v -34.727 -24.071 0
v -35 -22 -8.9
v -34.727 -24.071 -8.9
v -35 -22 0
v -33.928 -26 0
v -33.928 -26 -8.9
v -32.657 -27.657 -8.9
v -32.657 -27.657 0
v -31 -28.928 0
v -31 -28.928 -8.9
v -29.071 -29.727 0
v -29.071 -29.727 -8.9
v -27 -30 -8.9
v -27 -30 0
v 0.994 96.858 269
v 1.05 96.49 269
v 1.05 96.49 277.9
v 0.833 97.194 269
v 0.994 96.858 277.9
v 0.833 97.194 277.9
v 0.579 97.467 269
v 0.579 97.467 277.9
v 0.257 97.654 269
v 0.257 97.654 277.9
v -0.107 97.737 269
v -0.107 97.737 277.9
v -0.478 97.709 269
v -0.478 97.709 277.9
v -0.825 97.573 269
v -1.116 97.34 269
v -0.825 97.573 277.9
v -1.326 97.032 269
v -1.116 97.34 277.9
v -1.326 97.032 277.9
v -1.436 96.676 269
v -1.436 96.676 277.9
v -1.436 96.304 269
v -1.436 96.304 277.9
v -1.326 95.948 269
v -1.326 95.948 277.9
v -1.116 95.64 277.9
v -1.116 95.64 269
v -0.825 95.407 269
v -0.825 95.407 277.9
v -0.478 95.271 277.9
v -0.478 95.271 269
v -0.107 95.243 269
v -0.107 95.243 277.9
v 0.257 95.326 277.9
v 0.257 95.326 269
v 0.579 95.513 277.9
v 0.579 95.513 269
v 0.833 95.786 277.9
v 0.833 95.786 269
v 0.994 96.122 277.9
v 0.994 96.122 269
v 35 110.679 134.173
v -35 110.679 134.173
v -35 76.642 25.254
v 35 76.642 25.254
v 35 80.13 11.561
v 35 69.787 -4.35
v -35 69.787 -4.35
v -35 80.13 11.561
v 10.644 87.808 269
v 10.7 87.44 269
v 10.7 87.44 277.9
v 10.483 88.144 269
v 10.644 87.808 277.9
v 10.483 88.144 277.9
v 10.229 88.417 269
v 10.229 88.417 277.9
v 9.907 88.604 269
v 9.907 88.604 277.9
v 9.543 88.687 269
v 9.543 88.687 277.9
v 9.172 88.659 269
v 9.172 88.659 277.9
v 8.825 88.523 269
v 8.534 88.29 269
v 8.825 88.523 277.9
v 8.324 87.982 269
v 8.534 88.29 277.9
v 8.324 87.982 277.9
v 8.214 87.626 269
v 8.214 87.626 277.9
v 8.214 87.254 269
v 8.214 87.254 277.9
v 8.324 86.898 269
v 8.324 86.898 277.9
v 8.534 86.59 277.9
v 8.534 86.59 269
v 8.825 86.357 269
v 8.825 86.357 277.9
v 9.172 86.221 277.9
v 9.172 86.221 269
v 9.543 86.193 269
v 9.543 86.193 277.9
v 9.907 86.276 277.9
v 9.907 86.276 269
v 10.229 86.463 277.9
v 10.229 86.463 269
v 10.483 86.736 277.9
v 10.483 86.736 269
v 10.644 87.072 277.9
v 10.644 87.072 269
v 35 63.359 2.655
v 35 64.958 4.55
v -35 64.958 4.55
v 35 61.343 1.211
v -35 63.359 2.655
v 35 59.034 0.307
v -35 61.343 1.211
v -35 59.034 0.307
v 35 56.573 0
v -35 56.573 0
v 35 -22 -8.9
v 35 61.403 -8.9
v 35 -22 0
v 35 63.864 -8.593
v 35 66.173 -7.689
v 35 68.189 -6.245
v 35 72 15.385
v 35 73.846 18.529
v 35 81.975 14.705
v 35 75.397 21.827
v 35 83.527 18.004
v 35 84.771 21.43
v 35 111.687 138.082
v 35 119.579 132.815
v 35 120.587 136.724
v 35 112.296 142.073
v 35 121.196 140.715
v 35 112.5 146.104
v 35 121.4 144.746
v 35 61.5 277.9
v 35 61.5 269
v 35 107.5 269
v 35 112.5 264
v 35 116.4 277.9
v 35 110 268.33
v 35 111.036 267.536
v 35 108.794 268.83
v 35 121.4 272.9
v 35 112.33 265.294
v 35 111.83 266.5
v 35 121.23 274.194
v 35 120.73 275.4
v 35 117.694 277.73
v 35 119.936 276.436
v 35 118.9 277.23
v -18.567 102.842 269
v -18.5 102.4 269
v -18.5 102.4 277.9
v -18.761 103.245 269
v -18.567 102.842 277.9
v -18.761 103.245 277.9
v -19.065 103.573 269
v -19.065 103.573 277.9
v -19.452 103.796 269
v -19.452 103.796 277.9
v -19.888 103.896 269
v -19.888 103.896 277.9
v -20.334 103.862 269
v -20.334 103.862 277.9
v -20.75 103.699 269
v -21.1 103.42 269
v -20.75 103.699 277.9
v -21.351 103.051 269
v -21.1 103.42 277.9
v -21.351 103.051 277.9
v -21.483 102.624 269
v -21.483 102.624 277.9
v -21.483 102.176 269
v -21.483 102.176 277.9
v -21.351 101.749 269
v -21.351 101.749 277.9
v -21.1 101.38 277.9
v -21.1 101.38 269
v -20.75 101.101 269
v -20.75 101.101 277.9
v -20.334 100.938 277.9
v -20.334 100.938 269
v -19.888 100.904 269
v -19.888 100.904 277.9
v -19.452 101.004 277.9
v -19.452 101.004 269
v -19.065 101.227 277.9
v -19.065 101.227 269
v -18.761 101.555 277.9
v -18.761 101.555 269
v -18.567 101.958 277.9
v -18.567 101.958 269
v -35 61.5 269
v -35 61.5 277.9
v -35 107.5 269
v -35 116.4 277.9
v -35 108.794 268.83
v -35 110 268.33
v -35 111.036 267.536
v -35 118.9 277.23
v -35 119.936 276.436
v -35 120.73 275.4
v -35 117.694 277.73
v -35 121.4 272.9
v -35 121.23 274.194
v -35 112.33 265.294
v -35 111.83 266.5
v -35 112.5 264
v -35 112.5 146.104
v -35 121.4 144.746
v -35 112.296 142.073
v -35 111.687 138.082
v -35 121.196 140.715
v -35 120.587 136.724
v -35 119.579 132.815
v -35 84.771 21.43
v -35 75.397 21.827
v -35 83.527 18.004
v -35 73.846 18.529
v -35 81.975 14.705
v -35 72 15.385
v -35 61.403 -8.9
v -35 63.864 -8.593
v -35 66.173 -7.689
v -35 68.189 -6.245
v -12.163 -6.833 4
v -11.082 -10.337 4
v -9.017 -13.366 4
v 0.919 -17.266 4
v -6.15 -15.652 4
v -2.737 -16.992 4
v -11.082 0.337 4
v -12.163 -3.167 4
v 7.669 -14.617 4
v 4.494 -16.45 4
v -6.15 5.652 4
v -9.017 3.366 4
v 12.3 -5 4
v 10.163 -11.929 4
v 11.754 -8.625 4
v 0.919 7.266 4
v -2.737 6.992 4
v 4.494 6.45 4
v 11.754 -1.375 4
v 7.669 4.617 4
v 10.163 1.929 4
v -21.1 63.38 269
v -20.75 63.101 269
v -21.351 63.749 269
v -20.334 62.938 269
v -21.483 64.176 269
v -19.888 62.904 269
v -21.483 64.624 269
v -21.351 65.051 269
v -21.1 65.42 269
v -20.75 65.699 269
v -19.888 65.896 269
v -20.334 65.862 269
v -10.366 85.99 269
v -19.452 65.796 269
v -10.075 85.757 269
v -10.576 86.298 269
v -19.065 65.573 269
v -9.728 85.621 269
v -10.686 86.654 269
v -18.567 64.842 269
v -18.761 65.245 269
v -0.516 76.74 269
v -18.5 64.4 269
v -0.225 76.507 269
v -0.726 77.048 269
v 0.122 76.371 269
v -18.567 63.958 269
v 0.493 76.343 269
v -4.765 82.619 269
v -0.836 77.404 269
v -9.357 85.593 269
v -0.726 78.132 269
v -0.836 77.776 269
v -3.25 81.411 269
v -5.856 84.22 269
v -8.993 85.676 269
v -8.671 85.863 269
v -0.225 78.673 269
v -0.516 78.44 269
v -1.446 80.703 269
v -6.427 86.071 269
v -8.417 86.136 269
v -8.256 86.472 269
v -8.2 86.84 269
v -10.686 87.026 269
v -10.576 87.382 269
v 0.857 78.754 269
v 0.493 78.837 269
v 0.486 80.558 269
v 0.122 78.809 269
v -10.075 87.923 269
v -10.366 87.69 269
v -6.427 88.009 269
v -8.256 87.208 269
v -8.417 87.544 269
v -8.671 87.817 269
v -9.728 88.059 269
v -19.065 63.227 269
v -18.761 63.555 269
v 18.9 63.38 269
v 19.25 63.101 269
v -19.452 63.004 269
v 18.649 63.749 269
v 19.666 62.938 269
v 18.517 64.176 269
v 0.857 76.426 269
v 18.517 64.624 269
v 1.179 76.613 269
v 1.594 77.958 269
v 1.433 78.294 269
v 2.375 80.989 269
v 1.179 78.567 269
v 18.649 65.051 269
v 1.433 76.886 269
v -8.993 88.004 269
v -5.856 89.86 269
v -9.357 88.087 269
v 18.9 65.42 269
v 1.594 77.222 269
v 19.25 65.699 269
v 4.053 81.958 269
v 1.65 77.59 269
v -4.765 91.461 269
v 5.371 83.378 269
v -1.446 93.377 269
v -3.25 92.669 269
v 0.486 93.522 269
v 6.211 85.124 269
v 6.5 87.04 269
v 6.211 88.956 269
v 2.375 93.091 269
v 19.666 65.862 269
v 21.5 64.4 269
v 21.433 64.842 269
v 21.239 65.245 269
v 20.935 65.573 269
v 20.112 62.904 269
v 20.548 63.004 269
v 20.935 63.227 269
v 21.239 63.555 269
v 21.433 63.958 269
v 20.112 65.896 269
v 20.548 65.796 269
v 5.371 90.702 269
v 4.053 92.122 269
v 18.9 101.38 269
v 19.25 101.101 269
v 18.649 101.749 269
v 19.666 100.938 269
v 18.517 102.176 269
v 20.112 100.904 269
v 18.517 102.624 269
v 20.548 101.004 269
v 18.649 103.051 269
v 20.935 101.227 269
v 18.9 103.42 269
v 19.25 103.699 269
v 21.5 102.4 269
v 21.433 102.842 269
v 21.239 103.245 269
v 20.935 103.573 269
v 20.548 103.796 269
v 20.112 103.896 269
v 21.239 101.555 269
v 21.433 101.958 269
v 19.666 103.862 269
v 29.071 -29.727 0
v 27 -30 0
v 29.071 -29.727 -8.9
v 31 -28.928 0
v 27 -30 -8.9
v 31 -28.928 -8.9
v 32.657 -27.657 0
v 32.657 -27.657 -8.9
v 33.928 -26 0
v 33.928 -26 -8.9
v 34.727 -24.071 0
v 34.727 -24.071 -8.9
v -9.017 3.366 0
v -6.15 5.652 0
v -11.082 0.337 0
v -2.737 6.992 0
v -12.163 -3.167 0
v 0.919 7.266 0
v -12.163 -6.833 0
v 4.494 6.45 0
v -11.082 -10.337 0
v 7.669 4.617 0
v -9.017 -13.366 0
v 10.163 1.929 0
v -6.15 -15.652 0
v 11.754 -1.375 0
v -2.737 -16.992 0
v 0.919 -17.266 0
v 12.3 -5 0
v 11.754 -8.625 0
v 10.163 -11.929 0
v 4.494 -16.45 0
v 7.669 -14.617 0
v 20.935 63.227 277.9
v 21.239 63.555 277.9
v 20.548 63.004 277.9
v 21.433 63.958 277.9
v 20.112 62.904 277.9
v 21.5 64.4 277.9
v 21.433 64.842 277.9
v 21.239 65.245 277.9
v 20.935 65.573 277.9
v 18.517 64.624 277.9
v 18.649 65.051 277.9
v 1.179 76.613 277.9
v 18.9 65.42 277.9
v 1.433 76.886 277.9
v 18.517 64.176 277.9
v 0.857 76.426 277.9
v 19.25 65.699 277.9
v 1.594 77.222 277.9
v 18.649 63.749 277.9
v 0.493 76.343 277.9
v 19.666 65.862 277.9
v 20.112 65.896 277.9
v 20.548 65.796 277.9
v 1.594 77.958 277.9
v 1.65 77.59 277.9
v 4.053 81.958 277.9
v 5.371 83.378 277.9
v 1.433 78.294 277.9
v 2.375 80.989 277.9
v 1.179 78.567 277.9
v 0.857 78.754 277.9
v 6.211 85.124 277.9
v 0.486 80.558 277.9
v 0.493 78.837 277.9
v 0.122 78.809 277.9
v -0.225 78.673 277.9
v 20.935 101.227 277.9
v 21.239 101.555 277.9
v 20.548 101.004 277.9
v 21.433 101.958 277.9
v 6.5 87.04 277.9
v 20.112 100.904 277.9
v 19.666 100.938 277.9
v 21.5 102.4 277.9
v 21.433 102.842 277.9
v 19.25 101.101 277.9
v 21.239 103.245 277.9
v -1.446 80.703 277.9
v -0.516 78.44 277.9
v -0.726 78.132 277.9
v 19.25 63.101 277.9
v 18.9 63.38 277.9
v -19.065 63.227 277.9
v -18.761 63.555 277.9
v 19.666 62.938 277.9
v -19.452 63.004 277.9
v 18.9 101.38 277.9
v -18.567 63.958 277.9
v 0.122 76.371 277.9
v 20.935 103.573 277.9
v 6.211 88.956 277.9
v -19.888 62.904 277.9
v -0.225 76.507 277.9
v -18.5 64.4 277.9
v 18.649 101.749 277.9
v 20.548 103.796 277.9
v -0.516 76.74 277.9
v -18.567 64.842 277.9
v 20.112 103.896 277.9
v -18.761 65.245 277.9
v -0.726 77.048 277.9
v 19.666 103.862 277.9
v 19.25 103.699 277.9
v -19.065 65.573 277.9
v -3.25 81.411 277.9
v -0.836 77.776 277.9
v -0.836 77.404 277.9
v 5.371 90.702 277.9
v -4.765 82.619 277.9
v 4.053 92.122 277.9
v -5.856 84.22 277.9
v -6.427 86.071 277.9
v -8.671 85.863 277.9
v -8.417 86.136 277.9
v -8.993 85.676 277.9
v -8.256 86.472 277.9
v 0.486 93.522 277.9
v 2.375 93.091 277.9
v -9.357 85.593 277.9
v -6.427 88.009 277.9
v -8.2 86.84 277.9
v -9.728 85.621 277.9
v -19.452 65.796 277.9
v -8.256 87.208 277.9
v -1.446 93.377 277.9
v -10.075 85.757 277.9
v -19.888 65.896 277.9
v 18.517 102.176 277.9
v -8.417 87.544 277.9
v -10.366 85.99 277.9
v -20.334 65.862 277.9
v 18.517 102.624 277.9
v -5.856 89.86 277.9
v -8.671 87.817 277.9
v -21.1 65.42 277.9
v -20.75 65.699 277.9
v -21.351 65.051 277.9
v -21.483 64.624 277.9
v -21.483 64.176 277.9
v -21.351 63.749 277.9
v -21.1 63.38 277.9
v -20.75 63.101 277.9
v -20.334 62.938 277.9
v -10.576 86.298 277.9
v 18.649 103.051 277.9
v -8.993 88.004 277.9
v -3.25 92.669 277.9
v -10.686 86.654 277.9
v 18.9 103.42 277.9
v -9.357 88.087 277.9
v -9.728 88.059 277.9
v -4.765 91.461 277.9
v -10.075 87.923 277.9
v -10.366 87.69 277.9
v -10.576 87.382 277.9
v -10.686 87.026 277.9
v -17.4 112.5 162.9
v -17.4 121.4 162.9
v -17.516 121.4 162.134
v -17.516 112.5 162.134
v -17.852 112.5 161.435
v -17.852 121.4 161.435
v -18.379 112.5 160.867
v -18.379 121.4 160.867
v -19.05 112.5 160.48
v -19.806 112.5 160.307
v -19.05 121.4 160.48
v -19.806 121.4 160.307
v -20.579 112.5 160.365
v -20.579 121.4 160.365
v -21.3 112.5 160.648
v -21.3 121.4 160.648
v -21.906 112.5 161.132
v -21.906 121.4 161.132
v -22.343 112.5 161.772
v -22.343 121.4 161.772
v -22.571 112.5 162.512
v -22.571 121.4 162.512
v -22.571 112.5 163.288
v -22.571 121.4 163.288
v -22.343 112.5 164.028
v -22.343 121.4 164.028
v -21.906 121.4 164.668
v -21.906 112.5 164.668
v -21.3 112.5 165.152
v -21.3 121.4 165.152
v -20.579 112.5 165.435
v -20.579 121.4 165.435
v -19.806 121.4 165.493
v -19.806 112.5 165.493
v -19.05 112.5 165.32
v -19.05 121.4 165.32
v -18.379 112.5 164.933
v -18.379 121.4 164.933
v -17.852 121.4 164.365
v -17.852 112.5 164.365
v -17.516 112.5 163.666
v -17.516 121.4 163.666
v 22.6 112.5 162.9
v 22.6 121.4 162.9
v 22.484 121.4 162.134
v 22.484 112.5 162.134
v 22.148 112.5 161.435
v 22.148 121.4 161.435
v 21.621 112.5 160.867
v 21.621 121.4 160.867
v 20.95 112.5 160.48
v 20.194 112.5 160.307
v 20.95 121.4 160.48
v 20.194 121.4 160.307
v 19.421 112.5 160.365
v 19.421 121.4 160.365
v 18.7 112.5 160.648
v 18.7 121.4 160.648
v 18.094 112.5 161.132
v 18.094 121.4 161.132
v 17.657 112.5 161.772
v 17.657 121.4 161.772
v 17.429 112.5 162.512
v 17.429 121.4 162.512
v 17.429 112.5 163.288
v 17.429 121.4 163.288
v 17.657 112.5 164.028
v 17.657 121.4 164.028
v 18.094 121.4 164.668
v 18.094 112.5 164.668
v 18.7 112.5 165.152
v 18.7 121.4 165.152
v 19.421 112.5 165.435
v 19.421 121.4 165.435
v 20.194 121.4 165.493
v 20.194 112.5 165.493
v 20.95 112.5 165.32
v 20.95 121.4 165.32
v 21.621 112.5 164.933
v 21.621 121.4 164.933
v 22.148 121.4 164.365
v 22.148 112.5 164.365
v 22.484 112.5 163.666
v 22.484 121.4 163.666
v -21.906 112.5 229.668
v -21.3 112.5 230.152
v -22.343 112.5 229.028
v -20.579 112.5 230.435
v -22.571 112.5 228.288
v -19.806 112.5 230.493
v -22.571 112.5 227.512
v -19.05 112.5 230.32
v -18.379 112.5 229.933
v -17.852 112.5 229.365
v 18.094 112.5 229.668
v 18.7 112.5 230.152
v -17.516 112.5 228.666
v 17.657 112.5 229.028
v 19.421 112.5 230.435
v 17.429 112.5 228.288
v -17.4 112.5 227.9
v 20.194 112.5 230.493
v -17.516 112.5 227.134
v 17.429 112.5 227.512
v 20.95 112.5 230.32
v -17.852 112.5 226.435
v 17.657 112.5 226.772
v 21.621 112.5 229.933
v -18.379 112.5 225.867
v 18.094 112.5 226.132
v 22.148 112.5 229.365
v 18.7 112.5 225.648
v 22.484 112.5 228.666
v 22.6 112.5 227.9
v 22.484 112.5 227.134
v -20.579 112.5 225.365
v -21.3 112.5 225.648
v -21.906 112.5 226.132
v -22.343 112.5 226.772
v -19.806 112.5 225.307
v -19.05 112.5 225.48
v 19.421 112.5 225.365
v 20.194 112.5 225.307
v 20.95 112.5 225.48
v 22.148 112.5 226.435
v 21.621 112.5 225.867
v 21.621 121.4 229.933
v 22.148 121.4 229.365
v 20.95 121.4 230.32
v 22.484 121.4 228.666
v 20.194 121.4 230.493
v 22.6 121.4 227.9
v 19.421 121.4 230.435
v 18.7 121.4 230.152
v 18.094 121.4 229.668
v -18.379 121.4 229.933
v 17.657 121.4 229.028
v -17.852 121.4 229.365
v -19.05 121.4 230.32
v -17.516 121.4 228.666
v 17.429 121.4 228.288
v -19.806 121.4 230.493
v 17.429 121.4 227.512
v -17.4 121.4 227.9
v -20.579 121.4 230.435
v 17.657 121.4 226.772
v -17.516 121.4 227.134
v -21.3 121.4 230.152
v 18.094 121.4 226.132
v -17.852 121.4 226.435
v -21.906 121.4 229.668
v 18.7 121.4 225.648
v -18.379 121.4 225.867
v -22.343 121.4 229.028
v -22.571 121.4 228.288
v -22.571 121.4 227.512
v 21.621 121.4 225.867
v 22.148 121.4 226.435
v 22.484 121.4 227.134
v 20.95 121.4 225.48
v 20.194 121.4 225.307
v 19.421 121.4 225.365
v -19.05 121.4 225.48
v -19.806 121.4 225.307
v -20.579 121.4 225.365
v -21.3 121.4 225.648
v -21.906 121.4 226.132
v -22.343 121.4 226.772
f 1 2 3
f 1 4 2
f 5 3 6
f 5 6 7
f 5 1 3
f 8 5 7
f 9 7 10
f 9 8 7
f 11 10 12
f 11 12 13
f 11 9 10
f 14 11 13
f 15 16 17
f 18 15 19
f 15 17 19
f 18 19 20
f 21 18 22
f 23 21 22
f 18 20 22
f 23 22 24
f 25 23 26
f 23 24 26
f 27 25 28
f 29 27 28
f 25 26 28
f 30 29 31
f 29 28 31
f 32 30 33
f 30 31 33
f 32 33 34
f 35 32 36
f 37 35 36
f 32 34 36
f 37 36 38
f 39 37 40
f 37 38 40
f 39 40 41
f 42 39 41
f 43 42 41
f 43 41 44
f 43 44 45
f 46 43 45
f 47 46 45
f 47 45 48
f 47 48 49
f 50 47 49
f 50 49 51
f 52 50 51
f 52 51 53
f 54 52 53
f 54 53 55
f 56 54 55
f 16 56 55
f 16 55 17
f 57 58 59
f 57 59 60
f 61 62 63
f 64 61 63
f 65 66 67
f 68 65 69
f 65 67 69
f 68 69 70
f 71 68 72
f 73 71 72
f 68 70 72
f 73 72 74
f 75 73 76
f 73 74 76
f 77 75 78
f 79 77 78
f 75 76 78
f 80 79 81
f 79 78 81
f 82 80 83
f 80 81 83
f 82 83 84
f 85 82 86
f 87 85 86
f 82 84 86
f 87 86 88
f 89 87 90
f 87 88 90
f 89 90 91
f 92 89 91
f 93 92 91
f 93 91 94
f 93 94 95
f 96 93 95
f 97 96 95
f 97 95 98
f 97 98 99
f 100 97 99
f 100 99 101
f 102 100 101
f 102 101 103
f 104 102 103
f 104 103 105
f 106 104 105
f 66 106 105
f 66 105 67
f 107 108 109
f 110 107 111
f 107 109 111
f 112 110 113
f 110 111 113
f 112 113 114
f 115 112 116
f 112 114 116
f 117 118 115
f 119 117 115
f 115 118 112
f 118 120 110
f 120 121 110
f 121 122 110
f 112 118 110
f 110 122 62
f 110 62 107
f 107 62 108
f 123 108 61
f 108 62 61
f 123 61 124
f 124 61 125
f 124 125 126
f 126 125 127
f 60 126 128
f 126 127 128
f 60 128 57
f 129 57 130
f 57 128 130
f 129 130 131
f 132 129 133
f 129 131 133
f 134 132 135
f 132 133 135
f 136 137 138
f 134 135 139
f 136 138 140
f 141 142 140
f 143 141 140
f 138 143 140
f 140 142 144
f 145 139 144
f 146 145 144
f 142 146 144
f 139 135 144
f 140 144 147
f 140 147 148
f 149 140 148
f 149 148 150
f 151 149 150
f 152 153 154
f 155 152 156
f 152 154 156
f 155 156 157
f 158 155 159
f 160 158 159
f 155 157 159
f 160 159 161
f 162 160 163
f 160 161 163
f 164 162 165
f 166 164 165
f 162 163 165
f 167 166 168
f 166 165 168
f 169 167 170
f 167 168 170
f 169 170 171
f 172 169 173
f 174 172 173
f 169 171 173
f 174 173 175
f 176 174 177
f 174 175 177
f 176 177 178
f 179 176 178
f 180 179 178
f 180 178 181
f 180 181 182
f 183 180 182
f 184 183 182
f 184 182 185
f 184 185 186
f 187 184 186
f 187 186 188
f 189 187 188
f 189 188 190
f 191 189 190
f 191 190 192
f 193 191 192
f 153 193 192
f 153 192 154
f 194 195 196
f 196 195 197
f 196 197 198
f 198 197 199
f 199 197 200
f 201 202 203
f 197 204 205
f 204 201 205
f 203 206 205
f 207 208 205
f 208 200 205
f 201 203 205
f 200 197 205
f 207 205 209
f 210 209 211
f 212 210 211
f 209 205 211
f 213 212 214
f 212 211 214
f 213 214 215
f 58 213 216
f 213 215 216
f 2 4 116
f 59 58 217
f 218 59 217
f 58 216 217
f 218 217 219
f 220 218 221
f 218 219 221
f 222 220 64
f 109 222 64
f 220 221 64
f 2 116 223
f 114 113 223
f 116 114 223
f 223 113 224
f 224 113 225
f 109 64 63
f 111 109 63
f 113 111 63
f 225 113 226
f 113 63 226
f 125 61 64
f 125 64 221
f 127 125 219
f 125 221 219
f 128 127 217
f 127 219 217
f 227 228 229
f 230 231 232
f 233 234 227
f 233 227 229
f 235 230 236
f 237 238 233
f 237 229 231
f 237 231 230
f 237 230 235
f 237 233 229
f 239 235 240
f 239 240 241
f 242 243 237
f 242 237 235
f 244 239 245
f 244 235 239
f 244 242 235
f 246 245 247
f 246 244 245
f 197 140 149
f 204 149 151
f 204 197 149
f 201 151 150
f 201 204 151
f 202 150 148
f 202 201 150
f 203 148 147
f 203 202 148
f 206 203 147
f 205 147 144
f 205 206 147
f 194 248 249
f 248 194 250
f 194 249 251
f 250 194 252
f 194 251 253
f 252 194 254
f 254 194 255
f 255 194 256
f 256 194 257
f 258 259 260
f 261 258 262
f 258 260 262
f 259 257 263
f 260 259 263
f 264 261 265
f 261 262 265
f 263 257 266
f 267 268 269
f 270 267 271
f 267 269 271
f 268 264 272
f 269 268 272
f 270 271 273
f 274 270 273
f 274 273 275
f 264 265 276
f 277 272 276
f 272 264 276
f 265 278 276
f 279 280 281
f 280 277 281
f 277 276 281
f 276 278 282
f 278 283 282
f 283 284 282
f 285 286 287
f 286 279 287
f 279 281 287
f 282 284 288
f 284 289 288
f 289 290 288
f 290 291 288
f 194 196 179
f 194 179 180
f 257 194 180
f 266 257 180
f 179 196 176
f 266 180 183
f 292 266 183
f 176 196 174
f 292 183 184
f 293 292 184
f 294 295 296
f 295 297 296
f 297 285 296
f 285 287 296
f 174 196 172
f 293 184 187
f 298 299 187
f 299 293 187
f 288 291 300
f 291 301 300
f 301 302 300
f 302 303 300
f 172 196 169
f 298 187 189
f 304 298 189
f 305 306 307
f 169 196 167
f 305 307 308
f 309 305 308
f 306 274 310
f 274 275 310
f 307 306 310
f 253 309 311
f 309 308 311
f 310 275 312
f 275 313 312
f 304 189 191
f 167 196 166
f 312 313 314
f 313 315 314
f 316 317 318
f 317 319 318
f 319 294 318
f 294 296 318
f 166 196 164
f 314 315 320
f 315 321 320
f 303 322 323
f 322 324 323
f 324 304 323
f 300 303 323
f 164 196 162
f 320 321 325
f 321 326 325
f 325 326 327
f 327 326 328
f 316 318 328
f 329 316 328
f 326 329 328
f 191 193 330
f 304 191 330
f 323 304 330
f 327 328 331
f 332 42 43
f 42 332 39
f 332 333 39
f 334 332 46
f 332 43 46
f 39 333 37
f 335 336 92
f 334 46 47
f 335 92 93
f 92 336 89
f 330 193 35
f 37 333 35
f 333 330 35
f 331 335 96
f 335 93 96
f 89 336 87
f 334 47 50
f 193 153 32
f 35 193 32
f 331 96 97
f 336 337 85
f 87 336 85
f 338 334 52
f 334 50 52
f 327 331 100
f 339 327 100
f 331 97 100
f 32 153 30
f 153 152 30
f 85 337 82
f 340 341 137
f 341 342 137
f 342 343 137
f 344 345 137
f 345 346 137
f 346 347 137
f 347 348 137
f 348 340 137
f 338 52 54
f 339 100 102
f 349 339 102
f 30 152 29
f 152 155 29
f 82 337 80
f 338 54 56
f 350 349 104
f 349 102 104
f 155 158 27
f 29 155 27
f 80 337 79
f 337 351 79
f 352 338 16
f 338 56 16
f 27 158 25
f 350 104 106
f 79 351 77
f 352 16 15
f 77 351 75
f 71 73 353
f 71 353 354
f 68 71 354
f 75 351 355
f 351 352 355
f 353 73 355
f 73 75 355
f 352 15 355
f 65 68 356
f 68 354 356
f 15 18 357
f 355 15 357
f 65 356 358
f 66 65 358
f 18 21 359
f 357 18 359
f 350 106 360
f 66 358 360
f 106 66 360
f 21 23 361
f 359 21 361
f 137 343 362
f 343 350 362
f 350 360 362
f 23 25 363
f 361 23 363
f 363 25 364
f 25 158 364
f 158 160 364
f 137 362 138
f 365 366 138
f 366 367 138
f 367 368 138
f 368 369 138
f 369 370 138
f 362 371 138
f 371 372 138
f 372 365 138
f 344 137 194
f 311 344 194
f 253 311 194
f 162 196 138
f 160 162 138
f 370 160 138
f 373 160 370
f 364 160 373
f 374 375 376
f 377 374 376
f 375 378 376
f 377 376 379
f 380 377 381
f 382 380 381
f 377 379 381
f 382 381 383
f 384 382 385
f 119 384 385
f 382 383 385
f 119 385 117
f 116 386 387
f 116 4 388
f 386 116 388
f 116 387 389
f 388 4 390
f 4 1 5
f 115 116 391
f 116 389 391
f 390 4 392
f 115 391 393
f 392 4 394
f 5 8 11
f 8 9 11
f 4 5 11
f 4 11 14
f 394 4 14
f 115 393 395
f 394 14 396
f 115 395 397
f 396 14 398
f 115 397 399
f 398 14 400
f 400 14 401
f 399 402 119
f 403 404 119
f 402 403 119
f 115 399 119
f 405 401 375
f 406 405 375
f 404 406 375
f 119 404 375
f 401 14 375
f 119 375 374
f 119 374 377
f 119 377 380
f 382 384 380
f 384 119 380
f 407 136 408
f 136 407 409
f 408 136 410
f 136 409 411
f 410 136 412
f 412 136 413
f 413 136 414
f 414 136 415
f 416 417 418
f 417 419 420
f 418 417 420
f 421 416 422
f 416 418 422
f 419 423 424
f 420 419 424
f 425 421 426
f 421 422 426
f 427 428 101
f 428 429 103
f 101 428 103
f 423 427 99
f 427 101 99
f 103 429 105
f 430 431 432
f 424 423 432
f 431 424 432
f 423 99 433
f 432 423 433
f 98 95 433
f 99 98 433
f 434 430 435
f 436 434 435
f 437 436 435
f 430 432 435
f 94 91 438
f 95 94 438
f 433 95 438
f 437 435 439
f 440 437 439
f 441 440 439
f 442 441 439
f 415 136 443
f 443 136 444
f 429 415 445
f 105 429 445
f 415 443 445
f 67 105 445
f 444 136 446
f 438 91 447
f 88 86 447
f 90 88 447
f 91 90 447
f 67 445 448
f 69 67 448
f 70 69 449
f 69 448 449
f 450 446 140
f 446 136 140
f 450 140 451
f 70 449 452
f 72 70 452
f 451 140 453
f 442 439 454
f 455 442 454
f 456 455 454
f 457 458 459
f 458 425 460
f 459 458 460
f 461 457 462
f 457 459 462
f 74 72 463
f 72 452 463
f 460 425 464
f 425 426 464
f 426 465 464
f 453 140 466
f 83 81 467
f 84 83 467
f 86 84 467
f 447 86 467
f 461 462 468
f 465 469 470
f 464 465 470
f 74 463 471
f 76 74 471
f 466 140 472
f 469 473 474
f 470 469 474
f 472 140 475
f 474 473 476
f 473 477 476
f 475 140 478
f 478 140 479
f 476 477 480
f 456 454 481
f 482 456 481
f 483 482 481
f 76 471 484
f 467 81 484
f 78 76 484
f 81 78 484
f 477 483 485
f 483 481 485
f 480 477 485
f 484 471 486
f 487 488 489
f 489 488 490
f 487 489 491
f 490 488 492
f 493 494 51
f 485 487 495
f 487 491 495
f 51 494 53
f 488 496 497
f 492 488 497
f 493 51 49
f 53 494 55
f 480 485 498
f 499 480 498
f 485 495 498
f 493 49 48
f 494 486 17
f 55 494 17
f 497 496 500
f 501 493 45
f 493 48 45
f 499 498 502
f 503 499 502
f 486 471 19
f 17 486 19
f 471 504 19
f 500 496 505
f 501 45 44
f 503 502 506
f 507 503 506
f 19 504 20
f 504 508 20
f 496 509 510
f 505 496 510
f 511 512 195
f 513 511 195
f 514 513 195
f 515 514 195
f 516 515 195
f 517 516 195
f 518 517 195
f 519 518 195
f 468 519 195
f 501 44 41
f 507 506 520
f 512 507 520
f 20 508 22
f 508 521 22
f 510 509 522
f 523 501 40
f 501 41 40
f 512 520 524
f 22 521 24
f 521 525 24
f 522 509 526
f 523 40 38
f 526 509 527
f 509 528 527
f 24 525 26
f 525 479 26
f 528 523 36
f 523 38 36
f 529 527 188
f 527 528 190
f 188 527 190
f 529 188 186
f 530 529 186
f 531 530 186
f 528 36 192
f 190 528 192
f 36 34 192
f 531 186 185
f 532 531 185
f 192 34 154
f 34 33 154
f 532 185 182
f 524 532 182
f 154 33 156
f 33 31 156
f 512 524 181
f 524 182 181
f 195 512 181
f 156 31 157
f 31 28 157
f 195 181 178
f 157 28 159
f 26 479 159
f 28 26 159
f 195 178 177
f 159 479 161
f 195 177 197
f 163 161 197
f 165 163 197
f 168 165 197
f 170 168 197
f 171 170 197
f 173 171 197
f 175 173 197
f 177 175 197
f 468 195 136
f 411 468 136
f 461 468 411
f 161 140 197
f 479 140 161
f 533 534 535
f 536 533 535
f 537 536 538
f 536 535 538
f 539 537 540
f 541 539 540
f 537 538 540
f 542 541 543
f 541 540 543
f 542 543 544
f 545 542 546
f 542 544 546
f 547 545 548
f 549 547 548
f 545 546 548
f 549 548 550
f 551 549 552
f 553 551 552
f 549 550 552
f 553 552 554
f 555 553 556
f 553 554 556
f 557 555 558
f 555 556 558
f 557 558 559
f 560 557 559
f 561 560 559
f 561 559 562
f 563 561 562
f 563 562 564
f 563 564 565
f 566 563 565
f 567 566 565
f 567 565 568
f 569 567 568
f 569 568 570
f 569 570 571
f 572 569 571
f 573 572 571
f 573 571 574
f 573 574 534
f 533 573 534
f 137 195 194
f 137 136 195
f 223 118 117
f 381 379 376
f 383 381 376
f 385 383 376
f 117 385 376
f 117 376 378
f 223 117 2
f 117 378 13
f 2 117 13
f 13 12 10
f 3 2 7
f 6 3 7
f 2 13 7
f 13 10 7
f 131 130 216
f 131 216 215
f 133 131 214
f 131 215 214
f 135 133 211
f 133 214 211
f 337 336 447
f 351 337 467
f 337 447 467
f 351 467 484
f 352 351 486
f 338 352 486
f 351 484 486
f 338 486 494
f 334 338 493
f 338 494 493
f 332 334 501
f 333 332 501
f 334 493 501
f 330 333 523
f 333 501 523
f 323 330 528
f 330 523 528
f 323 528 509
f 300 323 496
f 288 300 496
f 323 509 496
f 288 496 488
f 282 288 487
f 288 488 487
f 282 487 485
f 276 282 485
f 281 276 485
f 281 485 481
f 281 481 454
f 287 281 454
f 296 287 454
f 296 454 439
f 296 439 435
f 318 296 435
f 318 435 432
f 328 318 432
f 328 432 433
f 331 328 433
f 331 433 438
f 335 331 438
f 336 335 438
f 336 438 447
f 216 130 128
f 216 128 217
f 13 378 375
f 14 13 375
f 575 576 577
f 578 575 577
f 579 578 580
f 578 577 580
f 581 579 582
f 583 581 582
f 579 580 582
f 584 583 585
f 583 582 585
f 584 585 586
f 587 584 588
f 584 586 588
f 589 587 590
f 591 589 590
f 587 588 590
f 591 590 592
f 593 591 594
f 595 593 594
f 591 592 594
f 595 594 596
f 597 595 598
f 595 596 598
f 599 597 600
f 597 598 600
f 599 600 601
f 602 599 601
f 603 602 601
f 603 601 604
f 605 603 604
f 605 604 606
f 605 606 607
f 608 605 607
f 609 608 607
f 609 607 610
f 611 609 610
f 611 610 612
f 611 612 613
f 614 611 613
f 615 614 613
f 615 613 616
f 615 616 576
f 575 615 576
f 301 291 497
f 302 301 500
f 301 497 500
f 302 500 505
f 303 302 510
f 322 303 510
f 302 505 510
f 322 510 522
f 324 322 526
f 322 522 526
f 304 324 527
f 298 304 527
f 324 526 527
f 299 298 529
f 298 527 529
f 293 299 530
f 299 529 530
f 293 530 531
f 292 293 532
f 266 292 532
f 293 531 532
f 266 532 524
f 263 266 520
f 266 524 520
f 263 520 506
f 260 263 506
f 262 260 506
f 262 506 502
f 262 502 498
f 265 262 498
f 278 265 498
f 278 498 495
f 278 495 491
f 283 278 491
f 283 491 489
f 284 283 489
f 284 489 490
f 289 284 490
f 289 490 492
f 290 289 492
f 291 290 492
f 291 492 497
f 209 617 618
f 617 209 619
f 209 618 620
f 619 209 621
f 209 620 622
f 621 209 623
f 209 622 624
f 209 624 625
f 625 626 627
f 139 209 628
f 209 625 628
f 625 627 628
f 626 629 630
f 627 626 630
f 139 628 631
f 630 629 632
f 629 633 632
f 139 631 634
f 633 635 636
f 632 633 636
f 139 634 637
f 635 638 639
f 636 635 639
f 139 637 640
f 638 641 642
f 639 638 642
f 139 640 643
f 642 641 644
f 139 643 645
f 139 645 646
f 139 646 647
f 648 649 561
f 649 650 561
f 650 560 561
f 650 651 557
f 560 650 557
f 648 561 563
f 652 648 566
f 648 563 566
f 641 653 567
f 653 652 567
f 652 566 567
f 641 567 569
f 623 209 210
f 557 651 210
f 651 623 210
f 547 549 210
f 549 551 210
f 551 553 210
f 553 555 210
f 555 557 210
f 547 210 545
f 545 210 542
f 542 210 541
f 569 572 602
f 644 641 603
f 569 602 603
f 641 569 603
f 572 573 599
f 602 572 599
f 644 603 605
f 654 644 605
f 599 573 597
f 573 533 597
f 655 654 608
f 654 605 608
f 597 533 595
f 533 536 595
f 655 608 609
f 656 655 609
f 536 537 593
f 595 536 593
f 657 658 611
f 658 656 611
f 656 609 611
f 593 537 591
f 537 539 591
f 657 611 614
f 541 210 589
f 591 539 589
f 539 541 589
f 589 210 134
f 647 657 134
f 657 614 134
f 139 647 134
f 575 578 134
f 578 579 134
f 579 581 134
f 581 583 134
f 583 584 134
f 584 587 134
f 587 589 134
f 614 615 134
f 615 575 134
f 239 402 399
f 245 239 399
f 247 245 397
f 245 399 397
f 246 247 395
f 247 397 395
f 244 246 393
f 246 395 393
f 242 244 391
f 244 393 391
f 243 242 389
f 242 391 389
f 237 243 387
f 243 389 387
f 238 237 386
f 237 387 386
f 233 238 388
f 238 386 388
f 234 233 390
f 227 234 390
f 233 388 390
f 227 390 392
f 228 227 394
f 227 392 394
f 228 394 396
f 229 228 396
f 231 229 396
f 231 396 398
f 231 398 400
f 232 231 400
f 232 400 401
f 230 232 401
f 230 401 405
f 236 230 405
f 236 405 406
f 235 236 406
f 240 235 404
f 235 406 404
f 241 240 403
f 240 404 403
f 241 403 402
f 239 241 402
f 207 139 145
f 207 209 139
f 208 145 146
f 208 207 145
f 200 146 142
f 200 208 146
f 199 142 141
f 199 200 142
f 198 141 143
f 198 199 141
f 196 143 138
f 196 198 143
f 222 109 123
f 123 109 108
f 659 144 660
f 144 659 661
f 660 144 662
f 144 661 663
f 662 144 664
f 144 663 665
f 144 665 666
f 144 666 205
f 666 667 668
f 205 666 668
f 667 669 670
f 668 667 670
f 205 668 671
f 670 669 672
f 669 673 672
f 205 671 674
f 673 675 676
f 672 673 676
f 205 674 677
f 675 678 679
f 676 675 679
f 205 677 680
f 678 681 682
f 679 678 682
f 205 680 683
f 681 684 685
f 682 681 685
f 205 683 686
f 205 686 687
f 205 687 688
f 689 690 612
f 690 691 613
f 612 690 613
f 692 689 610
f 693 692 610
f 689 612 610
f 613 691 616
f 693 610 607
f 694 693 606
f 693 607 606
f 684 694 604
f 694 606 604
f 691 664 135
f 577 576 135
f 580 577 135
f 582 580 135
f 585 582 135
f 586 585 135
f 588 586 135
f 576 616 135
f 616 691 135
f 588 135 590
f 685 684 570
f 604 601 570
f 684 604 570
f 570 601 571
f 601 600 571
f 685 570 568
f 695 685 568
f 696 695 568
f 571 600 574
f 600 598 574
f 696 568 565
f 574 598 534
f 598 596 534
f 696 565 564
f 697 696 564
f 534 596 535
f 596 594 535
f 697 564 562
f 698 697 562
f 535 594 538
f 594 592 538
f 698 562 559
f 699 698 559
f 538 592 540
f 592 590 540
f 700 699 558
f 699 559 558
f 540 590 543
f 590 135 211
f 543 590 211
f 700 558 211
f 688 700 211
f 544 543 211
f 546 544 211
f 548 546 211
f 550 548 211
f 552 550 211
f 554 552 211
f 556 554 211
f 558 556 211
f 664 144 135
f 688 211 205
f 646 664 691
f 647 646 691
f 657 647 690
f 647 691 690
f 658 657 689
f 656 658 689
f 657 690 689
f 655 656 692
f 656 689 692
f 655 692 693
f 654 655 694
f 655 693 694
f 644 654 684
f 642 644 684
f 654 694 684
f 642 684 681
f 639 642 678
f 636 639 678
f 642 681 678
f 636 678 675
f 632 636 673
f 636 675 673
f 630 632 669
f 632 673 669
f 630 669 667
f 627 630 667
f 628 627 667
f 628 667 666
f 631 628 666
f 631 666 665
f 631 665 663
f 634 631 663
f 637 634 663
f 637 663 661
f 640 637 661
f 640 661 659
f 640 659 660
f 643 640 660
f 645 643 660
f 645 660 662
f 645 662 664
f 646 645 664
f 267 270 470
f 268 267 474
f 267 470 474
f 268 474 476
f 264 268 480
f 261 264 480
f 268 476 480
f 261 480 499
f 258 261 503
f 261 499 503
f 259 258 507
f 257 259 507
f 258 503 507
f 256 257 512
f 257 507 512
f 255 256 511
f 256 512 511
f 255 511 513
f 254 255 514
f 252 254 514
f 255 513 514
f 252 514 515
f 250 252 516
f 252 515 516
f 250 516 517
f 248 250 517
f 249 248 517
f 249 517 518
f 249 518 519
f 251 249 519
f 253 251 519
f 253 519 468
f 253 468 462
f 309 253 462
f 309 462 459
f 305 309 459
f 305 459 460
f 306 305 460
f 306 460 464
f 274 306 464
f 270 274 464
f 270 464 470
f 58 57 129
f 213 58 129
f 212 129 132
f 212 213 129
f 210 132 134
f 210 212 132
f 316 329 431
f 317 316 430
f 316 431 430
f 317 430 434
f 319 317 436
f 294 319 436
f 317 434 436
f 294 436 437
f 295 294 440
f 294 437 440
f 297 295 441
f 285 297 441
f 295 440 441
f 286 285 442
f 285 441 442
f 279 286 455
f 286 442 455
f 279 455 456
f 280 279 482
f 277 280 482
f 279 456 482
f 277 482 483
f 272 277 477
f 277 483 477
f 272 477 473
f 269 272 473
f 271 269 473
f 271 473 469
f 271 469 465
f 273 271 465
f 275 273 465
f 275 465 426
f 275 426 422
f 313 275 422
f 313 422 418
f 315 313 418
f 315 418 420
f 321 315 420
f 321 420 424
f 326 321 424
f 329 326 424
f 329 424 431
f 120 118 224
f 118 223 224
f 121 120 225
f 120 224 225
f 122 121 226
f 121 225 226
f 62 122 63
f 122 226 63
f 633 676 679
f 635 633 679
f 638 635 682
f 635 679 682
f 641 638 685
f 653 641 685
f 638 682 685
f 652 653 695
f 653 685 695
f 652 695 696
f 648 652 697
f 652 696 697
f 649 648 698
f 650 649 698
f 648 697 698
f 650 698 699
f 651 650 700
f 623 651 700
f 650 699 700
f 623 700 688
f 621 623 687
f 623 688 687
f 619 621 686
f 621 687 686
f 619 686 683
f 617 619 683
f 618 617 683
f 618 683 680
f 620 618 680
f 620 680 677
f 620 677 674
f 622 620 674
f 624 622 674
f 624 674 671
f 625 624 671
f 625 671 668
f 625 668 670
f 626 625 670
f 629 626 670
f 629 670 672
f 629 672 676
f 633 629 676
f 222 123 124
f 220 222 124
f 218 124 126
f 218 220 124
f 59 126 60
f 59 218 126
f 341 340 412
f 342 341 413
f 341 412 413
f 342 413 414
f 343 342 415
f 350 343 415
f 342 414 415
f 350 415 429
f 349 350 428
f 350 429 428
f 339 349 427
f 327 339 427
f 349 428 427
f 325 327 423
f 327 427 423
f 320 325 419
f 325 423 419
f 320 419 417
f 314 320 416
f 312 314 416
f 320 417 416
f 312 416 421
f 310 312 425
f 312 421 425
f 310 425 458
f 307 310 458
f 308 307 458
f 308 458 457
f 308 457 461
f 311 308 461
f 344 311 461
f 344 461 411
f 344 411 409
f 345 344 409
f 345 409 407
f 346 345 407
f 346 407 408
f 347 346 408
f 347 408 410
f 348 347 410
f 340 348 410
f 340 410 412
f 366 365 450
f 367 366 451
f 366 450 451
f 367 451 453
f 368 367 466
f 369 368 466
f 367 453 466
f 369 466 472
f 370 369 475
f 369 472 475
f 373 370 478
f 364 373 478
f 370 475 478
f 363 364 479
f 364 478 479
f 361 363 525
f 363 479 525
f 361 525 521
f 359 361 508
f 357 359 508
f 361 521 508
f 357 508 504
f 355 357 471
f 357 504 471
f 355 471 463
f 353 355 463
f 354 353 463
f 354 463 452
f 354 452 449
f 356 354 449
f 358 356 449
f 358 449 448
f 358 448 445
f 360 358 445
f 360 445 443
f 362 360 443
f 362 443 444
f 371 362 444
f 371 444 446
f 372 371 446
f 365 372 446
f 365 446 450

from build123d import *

# Parameters (mm, degrees)
SKETCH3_W           = 70
SKETCH3_H           = 8.9
SKETCH4_R           = 12.3
BOSS_EXTRUDE1_DEPTH = 4
FILLET1_R           = 10
FILLET2_R           = 40
FILLET3_R           = 8
FILLET4_R           = 40
FILLET5_R           = 5
CUT_EXTRUDE1_REACH  = 288.8
SKETCH5_R           = 6.5
SKETCH5_R_2         = 1.25
CUT_EXTRUDE2_REACH  = 153.4
SKETCH6_R           = 2.6
CUT_EXTRUDE3_REACH  = 288.8
SKETCH7_R           = 1.5


with BuildPart() as part:
    # Sweep1: sweep along a path in Sketch1
    with BuildLine(Plane(origin=(0, 0, 0), x_dir=(0, 0, -1), z_dir=(1, 0, 0))) as sweep1_path:
        Line((-269, 61.5), (-269, 112.5))
        Line((-269, 112.5), (-140, 112.5))
        Line((-140, 112.5), (-20, 75))
        Line((-20, 75), (0, 62))
        Line((0, 62), (0, 0))
        Line((0, 0), (0, -30))
    # Sketch3 → Sweep1 (sweep)
    with BuildSketch(Plane(origin=(0, 0, 0), x_dir=(1, 0, 0), z_dir=(0, 1, 0))):
        with Locations((0, 4.45)):
            Rectangle(SKETCH3_W, SKETCH3_H)
    sweep(path=sweep1_path.line, transition=Transition.RIGHT)

    # Sketch4 → Boss-Extrude1 (add)
    with BuildSketch(Plane.XY):
        with Locations((0, -5)):
            Circle(SKETCH4_R)
    extrude(amount=BOSS_EXTRUDE1_DEPTH)

    # Fillet1
    fillet1_edges = [part.edges().sort_by_distance(p)[0] for p in [
        (0, 66.829905793, -8.9),
        (0, 62, 0),
    ]]
    fillet(fillet1_edges, radius=FILLET1_R)

    # Fillet2
    fillet2_edges = [part.edges().sort_by_distance(p)[0] for p in [
        (0, 83.129581848, 16.176424699),
        (0, 75, 20),
    ]]
    fillet(fillet2_edges, radius=FILLET2_R)

    # Fillet3
    fillet3_edges = [part.edges().sort_by_distance(p)[0] for p in [
        (35, -30, -4.45),
        (-35, -30, -4.45),
    ]]
    fillet(fillet3_edges, radius=FILLET3_R)

    # Fillet4
    fillet4_edges = [part.edges().sort_by_distance(p)[0] for p in [
        (0, 121.4, 138.641762787),
        (0, 112.5, 140),
    ]]
    fillet(fillet4_edges, radius=FILLET4_R)

    # Fillet5
    fillet5_edges = [part.edges().sort_by_distance(p)[0] for p in [
        (0, 112.5, 269),
        (0, 121.4, 277.9),
    ]]
    fillet(fillet5_edges, radius=FILLET5_R)

    # Sketch5 → Cut-Extrude1 (cut, up to next)
    with BuildSketch(Plane.XY.offset(277.9), mode=Mode.PRIVATE) as cut_extrude1_sk1:
        with Locations((0, 87.04)):
            Circle(SKETCH5_R)
    cut_extrude1_tool1 = extrude(cut_extrude1_sk1.sketch, amount=-CUT_EXTRUDE1_REACH, mode=Mode.PRIVATE) & part.part
    add(cut_extrude1_tool1.solids().sort_by_distance((0, 87.04, 277.9))[0], mode=Mode.SUBTRACT)
    # Sketch5 → Cut-Extrude1 (cut, up to next)
    with BuildSketch(Plane.XY.offset(277.9), mode=Mode.PRIVATE) as cut_extrude1_sk2:
        with Locations((-0.2, 96.49)):
            Circle(SKETCH5_R_2)
    cut_extrude1_tool2 = extrude(cut_extrude1_sk2.sketch, amount=-CUT_EXTRUDE1_REACH, mode=Mode.PRIVATE) & part.part
    add(cut_extrude1_tool2.solids().sort_by_distance((-0.2, 96.49, 277.9))[0], mode=Mode.SUBTRACT)
    # Sketch5 → Cut-Extrude1 (cut, up to next)
    with BuildSketch(Plane.XY.offset(277.9), mode=Mode.PRIVATE) as cut_extrude1_sk3:
        with Locations((0.4, 77.59)):
            Circle(SKETCH5_R_2)
    cut_extrude1_tool3 = extrude(cut_extrude1_sk3.sketch, amount=-CUT_EXTRUDE1_REACH, mode=Mode.PRIVATE) & part.part
    add(cut_extrude1_tool3.solids().sort_by_distance((0.4, 77.59, 277.9))[0], mode=Mode.SUBTRACT)
    # Sketch5 → Cut-Extrude1 (cut, up to next)
    with BuildSketch(Plane.XY.offset(277.9), mode=Mode.PRIVATE) as cut_extrude1_sk4:
        with Locations((-9.45, 86.84)):
            Circle(SKETCH5_R_2)
    cut_extrude1_tool4 = extrude(cut_extrude1_sk4.sketch, amount=-CUT_EXTRUDE1_REACH, mode=Mode.PRIVATE) & part.part
    add(cut_extrude1_tool4.solids().sort_by_distance((-9.45, 86.84, 277.9))[0], mode=Mode.SUBTRACT)
    # Sketch5 → Cut-Extrude1 (cut, up to next)
    with BuildSketch(Plane.XY.offset(277.9), mode=Mode.PRIVATE) as cut_extrude1_sk5:
        with Locations((9.45, 87.44)):
            Circle(SKETCH5_R_2)
    cut_extrude1_tool5 = extrude(cut_extrude1_sk5.sketch, amount=-CUT_EXTRUDE1_REACH, mode=Mode.PRIVATE) & part.part
    add(cut_extrude1_tool5.solids().sort_by_distance((9.45, 87.44, 277.9))[0], mode=Mode.SUBTRACT)

    # Sketch6 → Cut-Extrude2 (cut, up to next)
    with BuildSketch(Plane(origin=(0, 121.4, 0), x_dir=(1, 0, 0), z_dir=(0, 1, 0)), mode=Mode.PRIVATE) as cut_extrude2_sk1:
        with Locations((-20, -162.9)):
            Circle(SKETCH6_R)
    cut_extrude2_tool1 = extrude(cut_extrude2_sk1.sketch, amount=-CUT_EXTRUDE2_REACH, mode=Mode.PRIVATE) & part.part
    add(cut_extrude2_tool1.solids().sort_by_distance((-20, 121.4, 162.9))[0], mode=Mode.SUBTRACT)
    # Sketch6 → Cut-Extrude2 (cut, up to next)
    with BuildSketch(Plane(origin=(0, 121.4, 0), x_dir=(1, 0, 0), z_dir=(0, 1, 0)), mode=Mode.PRIVATE) as cut_extrude2_sk2:
        with Locations((20, -162.9)):
            Circle(SKETCH6_R)
    cut_extrude2_tool2 = extrude(cut_extrude2_sk2.sketch, amount=-CUT_EXTRUDE2_REACH, mode=Mode.PRIVATE) & part.part
    add(cut_extrude2_tool2.solids().sort_by_distance((20, 121.4, 162.9))[0], mode=Mode.SUBTRACT)
    # Sketch6 → Cut-Extrude2 (cut, up to next)
    with BuildSketch(Plane(origin=(0, 121.4, 0), x_dir=(1, 0, 0), z_dir=(0, 1, 0)), mode=Mode.PRIVATE) as cut_extrude2_sk3:
        with Locations((-20, -227.9)):
            Circle(SKETCH6_R)
    cut_extrude2_tool3 = extrude(cut_extrude2_sk3.sketch, amount=-CUT_EXTRUDE2_REACH, mode=Mode.PRIVATE) & part.part
    add(cut_extrude2_tool3.solids().sort_by_distance((-20, 121.4, 227.9))[0], mode=Mode.SUBTRACT)
    # Sketch6 → Cut-Extrude2 (cut, up to next)
    with BuildSketch(Plane(origin=(0, 121.4, 0), x_dir=(1, 0, 0), z_dir=(0, 1, 0)), mode=Mode.PRIVATE) as cut_extrude2_sk4:
        with Locations((20, -227.9)):
            Circle(SKETCH6_R)
    cut_extrude2_tool4 = extrude(cut_extrude2_sk4.sketch, amount=-CUT_EXTRUDE2_REACH, mode=Mode.PRIVATE) & part.part
    add(cut_extrude2_tool4.solids().sort_by_distance((20, 121.4, 227.9))[0], mode=Mode.SUBTRACT)

    # Sketch7 → Cut-Extrude3 (cut, up to next)
    with BuildSketch(Plane.XY.offset(277.9), mode=Mode.PRIVATE) as cut_extrude3_sk1:
        with Locations((20, 102.4)):
            Circle(SKETCH7_R)
    cut_extrude3_tool1 = extrude(cut_extrude3_sk1.sketch, amount=-CUT_EXTRUDE3_REACH, mode=Mode.PRIVATE) & part.part
    add(cut_extrude3_tool1.solids().sort_by_distance((20, 102.4, 277.9))[0], mode=Mode.SUBTRACT)
    # Sketch7 → Cut-Extrude3 (cut, up to next)
    with BuildSketch(Plane.XY.offset(277.9), mode=Mode.PRIVATE) as cut_extrude3_sk2:
        with Locations((20, 64.4)):
            Circle(SKETCH7_R)
    cut_extrude3_tool2 = extrude(cut_extrude3_sk2.sketch, amount=-CUT_EXTRUDE3_REACH, mode=Mode.PRIVATE) & part.part
    add(cut_extrude3_tool2.solids().sort_by_distance((20, 64.4, 277.9))[0], mode=Mode.SUBTRACT)
    # Sketch7 → Cut-Extrude3 (cut, up to next)
    with BuildSketch(Plane.XY.offset(277.9), mode=Mode.PRIVATE) as cut_extrude3_sk3:
        with Locations((-20, 102.4)):
            Circle(SKETCH7_R)
    cut_extrude3_tool3 = extrude(cut_extrude3_sk3.sketch, amount=-CUT_EXTRUDE3_REACH, mode=Mode.PRIVATE) & part.part
    add(cut_extrude3_tool3.solids().sort_by_distance((-20, 102.4, 277.9))[0], mode=Mode.SUBTRACT)
    # Sketch7 → Cut-Extrude3 (cut, up to next)
    with BuildSketch(Plane.XY.offset(277.9), mode=Mode.PRIVATE) as cut_extrude3_sk4:
        with Locations((-20, 64.4)):
            Circle(SKETCH7_R)
    cut_extrude3_tool4 = extrude(cut_extrude3_sk4.sketch, amount=-CUT_EXTRUDE3_REACH, mode=Mode.PRIVATE) & part.part
    add(cut_extrude3_tool4.solids().sort_by_distance((-20, 64.4, 277.9))[0], mode=Mode.SUBTRACT)


solid = part.part
